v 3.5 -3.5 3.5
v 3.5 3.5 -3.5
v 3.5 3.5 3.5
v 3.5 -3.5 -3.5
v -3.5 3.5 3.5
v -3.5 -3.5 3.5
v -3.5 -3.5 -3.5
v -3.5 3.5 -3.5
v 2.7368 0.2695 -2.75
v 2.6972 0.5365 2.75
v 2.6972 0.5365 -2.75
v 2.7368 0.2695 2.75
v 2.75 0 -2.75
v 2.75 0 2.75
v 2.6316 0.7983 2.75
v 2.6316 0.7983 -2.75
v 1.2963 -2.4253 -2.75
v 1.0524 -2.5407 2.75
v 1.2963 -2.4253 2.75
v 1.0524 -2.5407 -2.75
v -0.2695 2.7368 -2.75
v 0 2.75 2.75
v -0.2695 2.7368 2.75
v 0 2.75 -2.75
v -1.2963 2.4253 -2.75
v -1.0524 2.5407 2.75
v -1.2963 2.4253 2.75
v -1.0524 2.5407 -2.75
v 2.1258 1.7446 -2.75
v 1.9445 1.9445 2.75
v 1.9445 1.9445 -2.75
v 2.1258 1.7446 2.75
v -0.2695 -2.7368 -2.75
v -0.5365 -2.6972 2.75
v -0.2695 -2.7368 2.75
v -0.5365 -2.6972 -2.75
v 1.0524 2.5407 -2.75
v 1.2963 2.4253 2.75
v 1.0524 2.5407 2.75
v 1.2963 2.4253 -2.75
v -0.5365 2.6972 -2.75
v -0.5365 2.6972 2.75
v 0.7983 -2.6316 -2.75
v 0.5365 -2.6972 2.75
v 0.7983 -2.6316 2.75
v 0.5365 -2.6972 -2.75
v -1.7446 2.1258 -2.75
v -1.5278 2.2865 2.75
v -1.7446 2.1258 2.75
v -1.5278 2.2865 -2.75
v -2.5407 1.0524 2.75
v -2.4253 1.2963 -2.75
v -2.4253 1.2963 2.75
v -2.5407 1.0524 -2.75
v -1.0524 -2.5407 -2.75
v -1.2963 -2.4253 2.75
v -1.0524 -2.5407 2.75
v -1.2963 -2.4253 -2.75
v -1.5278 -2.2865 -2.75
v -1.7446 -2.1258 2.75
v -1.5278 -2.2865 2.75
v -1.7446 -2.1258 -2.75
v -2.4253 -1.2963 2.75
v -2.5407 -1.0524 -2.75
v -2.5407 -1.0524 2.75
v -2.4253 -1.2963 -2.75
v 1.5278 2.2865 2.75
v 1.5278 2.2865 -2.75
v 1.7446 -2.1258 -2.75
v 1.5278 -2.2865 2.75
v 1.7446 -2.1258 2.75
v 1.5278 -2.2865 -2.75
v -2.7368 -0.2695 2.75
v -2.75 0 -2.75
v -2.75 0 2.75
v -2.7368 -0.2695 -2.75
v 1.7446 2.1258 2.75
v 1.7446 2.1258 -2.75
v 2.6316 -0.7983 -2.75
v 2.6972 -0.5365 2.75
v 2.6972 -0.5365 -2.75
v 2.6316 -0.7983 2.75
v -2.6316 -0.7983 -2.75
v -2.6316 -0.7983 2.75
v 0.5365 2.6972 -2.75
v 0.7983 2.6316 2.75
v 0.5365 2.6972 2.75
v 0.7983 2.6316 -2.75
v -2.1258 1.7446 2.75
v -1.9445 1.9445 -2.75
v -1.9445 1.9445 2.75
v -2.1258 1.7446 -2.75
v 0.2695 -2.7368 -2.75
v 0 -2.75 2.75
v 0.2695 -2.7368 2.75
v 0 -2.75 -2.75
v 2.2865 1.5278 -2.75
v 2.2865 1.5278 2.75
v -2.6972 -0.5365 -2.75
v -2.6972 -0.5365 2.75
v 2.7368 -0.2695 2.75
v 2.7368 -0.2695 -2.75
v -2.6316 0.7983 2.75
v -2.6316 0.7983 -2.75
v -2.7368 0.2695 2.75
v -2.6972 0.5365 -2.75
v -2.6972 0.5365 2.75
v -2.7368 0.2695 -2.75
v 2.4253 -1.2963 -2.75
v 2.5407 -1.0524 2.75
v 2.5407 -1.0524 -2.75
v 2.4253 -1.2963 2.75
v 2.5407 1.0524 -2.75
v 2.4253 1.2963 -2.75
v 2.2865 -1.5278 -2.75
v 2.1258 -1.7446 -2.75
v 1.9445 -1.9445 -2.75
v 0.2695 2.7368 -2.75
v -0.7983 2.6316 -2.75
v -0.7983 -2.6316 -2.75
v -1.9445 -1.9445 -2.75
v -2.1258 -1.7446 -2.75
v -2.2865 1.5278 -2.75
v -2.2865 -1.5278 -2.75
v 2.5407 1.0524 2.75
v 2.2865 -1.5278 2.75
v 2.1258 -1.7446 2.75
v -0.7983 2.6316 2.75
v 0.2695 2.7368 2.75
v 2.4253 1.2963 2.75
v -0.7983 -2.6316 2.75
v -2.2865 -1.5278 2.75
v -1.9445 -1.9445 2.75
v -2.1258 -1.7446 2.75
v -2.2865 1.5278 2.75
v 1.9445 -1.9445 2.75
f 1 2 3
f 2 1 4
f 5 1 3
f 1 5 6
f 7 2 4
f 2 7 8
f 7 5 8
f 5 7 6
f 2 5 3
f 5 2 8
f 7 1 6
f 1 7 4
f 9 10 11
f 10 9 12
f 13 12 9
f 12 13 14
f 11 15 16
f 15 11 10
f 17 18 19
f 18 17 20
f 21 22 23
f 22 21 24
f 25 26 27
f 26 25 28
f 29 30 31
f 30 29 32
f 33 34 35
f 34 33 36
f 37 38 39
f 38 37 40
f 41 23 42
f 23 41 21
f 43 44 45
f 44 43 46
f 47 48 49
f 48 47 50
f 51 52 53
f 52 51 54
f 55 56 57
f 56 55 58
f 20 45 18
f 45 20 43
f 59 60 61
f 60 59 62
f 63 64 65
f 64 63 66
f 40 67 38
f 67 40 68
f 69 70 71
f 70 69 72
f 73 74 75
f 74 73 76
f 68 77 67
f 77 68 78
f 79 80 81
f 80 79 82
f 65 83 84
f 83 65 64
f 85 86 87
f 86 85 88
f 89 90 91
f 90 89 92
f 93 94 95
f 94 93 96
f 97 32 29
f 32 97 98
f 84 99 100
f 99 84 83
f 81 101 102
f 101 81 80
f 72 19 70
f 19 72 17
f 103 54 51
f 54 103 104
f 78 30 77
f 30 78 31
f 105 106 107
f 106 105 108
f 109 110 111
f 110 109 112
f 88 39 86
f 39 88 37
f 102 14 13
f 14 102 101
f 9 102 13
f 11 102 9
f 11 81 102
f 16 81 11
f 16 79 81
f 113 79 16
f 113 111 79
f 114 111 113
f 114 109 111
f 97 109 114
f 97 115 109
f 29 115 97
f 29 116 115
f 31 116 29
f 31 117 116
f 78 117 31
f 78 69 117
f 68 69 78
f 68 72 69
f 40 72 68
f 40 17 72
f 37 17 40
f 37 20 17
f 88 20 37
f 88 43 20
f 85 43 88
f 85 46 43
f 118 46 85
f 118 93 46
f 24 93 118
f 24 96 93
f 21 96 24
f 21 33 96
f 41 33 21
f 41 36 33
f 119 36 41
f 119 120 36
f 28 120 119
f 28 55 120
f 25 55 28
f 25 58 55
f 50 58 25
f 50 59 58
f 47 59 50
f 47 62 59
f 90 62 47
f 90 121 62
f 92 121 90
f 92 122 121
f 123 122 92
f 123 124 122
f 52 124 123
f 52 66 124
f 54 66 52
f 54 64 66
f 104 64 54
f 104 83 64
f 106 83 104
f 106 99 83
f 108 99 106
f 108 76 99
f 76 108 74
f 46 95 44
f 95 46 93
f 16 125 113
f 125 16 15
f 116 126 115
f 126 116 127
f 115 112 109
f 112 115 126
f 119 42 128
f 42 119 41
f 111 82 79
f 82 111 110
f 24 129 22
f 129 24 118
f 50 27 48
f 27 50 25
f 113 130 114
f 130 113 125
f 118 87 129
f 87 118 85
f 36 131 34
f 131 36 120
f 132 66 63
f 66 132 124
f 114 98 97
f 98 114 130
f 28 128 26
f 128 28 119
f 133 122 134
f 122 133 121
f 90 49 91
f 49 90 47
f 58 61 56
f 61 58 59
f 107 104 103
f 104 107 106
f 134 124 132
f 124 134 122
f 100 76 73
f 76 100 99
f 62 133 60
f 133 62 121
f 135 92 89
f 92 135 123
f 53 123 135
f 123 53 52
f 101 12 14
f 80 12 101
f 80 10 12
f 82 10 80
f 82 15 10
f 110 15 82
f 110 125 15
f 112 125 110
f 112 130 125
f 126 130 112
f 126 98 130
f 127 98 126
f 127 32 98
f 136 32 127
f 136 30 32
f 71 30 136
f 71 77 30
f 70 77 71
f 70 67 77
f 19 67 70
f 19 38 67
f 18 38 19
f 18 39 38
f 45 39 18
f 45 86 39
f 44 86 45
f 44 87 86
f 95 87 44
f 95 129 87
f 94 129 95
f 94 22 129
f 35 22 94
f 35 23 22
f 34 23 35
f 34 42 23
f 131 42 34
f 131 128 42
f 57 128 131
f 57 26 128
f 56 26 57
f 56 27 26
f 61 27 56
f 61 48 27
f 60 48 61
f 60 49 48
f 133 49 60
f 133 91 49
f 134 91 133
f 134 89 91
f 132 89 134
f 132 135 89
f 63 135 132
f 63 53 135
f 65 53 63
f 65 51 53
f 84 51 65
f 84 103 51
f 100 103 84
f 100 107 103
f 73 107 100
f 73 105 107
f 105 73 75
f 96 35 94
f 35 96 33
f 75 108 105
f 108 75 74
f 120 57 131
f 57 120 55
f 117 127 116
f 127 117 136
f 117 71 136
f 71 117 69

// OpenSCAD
$fn = 64;

difference()
{
    cube([7,7,7], center=true);
    cylinder(d=5.5, h=5.5, center = true);
}
